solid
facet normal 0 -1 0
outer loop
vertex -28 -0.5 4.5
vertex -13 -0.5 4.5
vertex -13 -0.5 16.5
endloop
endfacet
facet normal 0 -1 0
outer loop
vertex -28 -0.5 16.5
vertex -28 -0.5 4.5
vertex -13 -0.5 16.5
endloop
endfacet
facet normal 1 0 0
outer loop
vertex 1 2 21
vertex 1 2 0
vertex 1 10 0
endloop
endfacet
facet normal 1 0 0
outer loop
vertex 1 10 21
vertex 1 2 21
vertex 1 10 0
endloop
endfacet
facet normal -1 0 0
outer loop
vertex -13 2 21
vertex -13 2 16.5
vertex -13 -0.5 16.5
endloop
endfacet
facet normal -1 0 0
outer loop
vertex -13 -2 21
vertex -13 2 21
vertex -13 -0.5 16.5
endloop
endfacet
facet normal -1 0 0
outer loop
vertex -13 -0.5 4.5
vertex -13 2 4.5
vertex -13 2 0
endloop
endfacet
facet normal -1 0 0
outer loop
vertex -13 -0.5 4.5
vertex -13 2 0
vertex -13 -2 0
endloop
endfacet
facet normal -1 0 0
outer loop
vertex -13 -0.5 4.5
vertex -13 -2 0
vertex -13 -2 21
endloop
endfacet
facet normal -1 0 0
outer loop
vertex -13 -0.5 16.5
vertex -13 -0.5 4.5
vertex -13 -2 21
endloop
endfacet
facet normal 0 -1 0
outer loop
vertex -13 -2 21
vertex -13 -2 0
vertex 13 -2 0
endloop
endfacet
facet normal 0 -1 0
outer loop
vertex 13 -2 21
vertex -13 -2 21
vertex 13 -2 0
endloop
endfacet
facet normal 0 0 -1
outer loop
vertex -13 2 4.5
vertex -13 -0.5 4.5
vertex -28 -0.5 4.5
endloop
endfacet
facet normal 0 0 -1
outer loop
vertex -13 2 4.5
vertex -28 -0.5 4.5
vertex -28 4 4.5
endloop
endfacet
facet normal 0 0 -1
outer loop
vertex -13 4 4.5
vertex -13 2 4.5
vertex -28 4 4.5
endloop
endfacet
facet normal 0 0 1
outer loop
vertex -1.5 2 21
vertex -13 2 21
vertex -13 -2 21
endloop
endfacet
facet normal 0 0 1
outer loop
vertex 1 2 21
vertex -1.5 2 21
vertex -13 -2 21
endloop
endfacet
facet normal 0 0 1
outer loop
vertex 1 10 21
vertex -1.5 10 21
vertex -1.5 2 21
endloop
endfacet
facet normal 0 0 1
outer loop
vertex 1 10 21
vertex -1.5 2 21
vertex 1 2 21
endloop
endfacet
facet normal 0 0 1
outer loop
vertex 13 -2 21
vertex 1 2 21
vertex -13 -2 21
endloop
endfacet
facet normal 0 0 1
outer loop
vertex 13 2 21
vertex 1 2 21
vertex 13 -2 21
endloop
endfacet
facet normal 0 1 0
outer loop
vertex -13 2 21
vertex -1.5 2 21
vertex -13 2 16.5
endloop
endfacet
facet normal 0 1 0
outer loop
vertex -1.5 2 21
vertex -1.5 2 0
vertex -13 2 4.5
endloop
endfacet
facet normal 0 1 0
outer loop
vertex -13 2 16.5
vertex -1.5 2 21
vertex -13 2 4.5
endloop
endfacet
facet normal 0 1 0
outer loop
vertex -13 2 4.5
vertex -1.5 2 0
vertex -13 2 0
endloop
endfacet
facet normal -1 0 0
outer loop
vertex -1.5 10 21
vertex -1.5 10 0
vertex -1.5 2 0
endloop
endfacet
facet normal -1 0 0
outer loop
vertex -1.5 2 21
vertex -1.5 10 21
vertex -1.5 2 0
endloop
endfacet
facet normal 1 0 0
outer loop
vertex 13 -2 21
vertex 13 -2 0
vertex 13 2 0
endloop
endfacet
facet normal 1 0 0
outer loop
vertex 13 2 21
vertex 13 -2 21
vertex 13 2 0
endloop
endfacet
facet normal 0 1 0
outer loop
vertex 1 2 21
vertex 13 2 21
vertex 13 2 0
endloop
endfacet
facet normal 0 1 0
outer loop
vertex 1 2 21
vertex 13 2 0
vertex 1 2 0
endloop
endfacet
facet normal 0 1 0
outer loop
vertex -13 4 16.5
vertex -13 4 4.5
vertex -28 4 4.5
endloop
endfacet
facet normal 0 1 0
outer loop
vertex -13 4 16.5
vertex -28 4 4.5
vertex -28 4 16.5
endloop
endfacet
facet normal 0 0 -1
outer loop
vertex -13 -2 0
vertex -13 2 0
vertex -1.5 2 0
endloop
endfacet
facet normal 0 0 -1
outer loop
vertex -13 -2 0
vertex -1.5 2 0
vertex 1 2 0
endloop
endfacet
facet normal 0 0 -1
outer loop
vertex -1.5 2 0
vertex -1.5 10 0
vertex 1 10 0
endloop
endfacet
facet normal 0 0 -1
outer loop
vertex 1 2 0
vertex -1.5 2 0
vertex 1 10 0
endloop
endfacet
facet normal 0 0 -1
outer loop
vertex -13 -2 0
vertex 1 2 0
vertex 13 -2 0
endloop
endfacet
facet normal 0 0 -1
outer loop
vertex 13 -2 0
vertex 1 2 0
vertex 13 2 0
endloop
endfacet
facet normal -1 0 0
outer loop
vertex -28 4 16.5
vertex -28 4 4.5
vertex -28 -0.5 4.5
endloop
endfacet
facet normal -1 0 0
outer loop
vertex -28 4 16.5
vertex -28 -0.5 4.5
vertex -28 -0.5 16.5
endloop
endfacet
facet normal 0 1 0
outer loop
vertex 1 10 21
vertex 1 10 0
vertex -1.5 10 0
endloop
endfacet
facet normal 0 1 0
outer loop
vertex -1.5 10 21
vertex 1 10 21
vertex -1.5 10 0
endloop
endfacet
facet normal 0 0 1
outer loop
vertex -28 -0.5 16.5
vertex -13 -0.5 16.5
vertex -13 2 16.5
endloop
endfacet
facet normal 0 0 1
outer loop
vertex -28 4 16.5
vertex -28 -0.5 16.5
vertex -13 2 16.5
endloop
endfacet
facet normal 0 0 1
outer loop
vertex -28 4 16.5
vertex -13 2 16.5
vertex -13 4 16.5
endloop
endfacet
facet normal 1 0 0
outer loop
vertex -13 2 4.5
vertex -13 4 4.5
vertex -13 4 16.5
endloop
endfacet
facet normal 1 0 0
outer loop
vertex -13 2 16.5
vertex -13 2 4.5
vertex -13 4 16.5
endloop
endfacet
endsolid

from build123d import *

# Parameters (mm, degrees)
BOSS_EXTRUDE2_DEPTH = 21
SKETCH2_W           = 12
SKETCH2_H           = 4.5
BOSS_EXTRUDE3_DEPTH = 15


with BuildPart() as part:
    # Sketch1 → Boss-Extrude2 (new body)
    with BuildSketch(Plane.XY):
        Polygon((1, 2), (1, 10), (-1.5, 10), (-1.5, 2), (-13, 2), (-13, -2), (13, -2), (13, 2), align=None)
    extrude(amount=BOSS_EXTRUDE2_DEPTH)

    # Sketch2 → Boss-Extrude3 (add)
    with BuildSketch(Plane.ZY.offset(13)):
        with Locations((10.5, 1.75)):
            Rectangle(SKETCH2_W, SKETCH2_H)
    extrude(amount=BOSS_EXTRUDE3_DEPTH)


solid = part.part
